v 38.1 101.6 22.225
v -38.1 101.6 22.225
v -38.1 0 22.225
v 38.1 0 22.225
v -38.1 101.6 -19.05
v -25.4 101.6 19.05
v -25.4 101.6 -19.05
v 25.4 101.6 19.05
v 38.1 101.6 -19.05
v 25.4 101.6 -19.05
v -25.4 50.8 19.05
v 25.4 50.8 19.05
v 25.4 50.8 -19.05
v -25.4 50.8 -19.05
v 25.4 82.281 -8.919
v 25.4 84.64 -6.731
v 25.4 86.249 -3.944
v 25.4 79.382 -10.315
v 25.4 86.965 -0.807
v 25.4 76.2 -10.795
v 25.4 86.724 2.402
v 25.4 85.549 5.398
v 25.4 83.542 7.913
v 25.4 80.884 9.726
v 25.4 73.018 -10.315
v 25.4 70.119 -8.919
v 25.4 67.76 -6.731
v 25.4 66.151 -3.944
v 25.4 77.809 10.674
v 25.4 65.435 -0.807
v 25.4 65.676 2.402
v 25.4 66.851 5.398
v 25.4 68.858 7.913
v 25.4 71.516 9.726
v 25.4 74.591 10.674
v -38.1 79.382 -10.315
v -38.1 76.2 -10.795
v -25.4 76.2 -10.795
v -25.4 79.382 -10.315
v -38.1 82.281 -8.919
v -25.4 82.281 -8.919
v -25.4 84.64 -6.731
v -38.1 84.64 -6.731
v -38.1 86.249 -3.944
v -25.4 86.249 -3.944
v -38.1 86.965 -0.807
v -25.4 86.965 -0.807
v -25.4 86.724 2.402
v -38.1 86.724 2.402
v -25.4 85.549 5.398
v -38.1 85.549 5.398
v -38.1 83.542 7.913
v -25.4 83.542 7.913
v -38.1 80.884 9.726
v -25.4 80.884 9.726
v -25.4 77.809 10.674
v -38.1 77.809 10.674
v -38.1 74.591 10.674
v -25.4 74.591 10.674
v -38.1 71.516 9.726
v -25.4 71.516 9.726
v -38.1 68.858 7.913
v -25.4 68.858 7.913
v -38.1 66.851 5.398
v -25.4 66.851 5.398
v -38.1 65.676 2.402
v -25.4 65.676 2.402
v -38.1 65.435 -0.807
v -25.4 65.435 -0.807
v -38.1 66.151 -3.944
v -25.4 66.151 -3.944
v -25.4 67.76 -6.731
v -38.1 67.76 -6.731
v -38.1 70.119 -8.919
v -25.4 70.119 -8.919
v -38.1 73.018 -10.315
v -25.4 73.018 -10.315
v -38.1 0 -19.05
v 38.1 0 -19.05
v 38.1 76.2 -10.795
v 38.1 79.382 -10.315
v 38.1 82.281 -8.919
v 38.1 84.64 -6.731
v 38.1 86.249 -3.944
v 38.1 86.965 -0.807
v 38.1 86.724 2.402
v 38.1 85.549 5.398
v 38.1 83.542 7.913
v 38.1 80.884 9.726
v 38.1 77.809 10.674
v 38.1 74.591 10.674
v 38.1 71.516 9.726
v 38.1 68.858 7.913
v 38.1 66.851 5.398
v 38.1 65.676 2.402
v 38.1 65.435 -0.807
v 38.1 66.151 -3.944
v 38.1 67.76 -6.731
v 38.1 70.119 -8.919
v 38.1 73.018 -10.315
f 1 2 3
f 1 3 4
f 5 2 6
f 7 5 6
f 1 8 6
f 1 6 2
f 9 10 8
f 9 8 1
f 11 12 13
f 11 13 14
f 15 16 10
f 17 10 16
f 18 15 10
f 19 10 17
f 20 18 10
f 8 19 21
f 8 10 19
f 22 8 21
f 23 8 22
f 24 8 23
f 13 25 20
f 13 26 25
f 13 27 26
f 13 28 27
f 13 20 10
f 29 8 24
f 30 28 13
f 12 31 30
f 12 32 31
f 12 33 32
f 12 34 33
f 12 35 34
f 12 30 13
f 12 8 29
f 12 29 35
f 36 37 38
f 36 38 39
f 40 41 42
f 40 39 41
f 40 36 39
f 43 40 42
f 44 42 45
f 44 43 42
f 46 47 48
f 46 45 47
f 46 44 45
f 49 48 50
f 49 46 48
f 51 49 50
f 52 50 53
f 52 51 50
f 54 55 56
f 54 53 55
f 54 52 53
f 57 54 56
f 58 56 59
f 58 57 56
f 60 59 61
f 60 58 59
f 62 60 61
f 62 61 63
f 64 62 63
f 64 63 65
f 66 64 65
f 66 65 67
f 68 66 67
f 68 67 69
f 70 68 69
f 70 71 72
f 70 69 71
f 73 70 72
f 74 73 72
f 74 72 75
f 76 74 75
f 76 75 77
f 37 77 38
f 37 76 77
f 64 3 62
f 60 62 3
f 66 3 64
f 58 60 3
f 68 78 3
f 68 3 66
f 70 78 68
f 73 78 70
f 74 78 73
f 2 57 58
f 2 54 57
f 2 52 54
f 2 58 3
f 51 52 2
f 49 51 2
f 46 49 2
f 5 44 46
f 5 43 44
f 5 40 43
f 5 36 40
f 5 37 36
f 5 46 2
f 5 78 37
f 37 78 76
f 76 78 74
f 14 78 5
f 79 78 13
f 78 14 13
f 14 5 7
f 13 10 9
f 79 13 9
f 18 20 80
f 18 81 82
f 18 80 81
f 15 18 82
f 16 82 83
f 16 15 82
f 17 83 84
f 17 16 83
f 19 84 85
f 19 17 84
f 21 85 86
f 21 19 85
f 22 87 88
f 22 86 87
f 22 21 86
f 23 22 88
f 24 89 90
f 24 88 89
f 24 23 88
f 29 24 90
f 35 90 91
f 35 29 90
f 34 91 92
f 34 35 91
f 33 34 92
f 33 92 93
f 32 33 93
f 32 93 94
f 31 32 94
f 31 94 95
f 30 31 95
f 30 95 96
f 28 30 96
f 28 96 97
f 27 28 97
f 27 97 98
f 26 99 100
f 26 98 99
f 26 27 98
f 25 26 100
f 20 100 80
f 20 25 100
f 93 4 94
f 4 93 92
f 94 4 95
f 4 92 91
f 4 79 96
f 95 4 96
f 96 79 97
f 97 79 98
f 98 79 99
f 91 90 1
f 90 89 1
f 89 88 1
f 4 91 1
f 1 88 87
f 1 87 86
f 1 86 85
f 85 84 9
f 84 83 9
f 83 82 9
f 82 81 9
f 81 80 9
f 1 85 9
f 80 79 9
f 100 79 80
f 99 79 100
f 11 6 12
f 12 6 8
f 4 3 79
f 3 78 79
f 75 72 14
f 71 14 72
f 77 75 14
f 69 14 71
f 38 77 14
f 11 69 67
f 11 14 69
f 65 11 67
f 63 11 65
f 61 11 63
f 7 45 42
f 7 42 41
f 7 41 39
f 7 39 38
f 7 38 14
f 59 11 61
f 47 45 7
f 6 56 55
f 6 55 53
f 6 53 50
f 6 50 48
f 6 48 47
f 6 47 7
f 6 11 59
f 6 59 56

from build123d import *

# Parameters (mm, degrees)
BOSS_EXTRUDE1_DEPTH     = 19.05
CUT_EXTRUDE1_DEPTH      = 111.168382488
CUT_EXTRUDE1_DEPTH_BACK = 111.168382488
SKETCH2_R               = 10.795
SKETCH3_W               = 76.2
SKETCH3_H               = 101.6
BOSS_EXTRUDE2_DEPTH     = 3.175


with BuildPart() as part:
    # Sketch1 → Boss-Extrude1 (new, symmetric)
    with BuildSketch(Plane.XY):
        Polygon((-38.1, 0), (38.1, 0), (38.1, 101.6), (25.4, 101.6), (25.4, 50.8), (-25.4, 50.8), (-25.4, 101.6), (-38.1, 101.6), align=None)
    extrude(amount=BOSS_EXTRUDE1_DEPTH, both=True)

    # Sketch2 → Cut-Extrude1 (cut, two sides: drawn at the far end of the back side and taken through both)
    with BuildSketch(Plane(origin=(0, 0, 0), x_dir=(0, 0, -1), z_dir=(1, 0, 0)).offset(-CUT_EXTRUDE1_DEPTH_BACK)):
        with Locations((0, 76.2)):
            Circle(SKETCH2_R)
    extrude(amount=CUT_EXTRUDE1_DEPTH + CUT_EXTRUDE1_DEPTH_BACK, mode=Mode.SUBTRACT)

    # Sketch3 → Boss-Extrude2 (add)
    with BuildSketch(Plane.XY.offset(19.05)):
        with Locations((0, 50.8)):
            Rectangle(SKETCH3_W, SKETCH3_H)
    extrude(amount=BOSS_EXTRUDE2_DEPTH)


solid = part.part
